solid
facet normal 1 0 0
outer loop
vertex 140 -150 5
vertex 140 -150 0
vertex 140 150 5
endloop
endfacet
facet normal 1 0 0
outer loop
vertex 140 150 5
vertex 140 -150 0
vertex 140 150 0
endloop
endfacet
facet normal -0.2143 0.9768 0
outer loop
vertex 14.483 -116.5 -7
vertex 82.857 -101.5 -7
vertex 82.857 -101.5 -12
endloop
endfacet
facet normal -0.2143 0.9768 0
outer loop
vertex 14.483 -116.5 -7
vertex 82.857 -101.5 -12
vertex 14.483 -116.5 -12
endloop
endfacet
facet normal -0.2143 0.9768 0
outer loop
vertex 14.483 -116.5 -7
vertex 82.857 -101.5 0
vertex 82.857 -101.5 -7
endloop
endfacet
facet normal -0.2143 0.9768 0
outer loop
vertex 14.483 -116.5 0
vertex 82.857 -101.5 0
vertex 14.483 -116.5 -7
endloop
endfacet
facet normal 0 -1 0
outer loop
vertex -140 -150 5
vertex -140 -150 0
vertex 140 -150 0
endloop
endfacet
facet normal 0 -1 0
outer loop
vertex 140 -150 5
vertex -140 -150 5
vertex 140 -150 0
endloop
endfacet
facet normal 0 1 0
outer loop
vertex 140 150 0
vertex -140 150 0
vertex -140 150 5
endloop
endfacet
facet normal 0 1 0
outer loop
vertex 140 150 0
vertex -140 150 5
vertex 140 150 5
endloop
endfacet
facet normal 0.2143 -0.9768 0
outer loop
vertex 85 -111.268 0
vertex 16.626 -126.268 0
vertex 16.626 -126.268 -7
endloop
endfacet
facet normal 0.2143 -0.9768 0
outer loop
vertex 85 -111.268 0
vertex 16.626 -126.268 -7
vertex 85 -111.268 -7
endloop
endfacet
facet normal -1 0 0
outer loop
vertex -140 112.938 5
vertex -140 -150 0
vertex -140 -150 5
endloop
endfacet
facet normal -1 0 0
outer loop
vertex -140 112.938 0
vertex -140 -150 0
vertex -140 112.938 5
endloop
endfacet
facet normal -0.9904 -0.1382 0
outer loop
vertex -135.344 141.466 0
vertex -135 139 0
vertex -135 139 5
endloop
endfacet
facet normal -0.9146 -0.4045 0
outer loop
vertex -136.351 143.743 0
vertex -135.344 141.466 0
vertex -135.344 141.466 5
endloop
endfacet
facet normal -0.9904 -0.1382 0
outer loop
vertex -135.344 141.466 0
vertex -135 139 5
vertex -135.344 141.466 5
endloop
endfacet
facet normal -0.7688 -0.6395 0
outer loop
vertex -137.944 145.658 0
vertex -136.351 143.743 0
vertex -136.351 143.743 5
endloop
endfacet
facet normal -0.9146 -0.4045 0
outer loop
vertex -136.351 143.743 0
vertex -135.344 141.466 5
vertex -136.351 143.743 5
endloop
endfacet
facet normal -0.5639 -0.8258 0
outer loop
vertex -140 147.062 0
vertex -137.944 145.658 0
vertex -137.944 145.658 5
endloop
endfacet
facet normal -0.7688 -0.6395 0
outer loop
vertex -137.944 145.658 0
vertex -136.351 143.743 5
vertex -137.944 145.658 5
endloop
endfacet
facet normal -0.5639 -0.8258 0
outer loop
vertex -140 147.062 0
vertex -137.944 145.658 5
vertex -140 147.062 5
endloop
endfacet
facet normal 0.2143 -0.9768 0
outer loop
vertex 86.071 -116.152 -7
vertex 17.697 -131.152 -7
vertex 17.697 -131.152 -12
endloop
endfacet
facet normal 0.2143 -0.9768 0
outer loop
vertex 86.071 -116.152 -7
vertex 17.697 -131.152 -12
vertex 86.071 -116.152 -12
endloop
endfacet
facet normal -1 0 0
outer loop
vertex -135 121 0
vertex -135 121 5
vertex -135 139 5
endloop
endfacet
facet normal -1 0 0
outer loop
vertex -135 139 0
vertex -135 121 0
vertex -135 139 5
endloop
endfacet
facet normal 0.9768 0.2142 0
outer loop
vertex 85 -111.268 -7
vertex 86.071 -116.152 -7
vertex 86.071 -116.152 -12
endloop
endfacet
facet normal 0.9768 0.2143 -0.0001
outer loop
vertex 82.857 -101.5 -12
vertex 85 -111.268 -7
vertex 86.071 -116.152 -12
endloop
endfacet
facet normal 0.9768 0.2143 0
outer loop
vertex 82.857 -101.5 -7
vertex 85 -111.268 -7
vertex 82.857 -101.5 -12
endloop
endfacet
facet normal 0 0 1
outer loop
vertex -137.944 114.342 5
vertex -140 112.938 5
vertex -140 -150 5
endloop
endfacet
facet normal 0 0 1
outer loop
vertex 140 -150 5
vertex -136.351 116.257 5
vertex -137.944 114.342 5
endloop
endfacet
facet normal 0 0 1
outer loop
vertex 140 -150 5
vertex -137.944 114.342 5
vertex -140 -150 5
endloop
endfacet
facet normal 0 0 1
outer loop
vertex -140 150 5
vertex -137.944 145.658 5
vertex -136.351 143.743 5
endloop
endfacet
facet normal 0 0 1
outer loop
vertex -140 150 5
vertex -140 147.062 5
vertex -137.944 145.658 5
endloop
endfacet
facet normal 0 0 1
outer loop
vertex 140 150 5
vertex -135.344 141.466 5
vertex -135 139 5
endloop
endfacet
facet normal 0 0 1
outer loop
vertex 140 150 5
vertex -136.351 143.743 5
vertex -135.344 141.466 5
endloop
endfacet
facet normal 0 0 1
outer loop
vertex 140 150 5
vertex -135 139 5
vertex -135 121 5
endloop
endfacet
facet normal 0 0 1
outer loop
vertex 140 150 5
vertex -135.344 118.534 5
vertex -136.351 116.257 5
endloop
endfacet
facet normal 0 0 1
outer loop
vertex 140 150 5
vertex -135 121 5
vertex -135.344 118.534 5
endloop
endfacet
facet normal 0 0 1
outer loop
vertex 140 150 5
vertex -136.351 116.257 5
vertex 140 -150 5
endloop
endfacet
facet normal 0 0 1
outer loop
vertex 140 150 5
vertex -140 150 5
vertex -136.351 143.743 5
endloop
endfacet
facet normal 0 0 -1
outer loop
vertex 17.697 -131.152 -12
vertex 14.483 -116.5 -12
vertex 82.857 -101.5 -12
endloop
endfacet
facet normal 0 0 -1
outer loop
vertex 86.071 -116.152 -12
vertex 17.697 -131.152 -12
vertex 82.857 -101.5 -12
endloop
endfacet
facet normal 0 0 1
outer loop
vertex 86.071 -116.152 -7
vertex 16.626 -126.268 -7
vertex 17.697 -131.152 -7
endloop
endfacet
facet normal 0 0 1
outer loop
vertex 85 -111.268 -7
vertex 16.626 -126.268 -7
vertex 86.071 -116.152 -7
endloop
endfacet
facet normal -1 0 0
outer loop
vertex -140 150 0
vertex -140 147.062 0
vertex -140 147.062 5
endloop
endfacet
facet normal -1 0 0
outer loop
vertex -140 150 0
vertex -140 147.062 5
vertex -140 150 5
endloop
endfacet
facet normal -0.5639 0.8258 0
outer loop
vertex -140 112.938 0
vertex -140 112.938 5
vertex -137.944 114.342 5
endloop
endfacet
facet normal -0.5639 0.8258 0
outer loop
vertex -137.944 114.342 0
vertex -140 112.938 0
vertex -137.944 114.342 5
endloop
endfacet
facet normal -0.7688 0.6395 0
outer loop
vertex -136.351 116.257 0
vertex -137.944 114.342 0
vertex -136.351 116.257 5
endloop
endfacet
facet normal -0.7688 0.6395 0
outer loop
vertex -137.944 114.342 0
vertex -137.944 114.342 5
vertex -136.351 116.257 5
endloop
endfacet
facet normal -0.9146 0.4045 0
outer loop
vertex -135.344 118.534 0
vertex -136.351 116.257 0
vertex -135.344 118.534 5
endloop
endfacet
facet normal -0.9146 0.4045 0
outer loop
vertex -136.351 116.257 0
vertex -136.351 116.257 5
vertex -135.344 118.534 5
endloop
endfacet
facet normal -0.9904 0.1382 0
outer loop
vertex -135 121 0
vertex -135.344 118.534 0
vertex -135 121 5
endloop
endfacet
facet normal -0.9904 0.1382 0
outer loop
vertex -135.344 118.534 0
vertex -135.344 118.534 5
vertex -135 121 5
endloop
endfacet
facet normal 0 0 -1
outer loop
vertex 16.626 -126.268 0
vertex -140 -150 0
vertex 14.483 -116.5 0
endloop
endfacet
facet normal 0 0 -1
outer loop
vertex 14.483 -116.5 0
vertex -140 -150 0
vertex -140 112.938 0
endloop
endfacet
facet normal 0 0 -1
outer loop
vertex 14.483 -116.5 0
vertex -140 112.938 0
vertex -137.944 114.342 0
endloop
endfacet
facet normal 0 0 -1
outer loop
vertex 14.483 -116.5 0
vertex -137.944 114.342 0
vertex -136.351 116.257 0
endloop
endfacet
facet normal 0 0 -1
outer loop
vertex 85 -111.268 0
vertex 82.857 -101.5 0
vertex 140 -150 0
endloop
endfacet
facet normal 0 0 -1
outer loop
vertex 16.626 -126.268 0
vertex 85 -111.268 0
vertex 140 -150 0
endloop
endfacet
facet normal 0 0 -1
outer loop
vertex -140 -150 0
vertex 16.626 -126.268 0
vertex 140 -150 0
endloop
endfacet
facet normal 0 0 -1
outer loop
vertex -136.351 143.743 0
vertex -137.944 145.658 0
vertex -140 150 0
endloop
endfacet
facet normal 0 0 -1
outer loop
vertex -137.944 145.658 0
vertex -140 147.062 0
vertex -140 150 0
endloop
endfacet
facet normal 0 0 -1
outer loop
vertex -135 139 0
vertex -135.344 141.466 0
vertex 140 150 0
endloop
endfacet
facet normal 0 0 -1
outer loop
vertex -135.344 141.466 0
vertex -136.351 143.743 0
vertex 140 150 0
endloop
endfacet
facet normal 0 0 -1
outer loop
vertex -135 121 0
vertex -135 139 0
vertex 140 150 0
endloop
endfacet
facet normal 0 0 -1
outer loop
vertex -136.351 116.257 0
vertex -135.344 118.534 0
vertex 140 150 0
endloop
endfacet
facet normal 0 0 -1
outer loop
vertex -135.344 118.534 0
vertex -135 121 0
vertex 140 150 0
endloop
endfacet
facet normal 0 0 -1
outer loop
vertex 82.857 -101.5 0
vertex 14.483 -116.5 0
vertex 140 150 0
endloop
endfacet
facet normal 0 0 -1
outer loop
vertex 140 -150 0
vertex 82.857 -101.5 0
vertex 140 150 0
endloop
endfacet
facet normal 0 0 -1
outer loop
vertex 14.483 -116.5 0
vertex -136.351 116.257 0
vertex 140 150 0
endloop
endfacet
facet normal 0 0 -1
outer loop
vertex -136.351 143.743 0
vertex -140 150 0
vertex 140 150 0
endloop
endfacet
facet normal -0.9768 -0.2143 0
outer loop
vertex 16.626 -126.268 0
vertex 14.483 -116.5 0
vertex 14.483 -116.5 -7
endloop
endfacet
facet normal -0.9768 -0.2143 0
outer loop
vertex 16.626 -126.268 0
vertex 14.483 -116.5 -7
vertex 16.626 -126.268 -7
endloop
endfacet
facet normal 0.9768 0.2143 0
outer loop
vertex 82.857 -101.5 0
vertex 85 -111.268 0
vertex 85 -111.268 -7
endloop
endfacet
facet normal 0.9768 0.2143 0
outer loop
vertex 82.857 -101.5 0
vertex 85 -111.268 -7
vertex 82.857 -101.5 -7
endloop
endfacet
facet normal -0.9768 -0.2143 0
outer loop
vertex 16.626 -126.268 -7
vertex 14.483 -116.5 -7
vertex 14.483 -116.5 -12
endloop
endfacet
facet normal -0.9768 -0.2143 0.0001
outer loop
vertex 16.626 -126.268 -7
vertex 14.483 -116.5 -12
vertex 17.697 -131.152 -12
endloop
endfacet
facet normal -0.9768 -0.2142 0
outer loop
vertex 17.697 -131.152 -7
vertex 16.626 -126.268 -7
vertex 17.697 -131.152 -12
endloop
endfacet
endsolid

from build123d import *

# Parameters (mm, degrees)
SKETCH1_W           = 280
SKETCH1_H           = 300
BOSS_EXTRUDE1_DEPTH = 5
CUT_EXTRUDE1_DEPTH  = 6
BOSS_EXTRUDE2_DEPTH = 7
BOSS_EXTRUDE3_DEPTH = 5


with BuildPart() as part:
    # Sketch1 → Boss-Extrude1 (new body)
    with BuildSketch(Plane.XY):
        Rectangle(SKETCH1_W, SKETCH1_H)
    extrude(amount=BOSS_EXTRUDE1_DEPTH)

    # Sketch2 → Cut-Extrude1 (cut, through all)
    with BuildSketch(Plane.XY.offset(5)):
        with BuildLine():
            Line((-153, 139), (-153, 121))
            ThreePointArc((-153, 121), (-144, 112), (-135, 121))
            Line((-135, 121), (-135, 139))
            ThreePointArc((-135, 139), (-144, 148), (-153, 139))
        make_face()
    extrude(amount=-CUT_EXTRUDE1_DEPTH, mode=Mode.SUBTRACT)

    # Sketch3 → Boss-Extrude2 (add)
    with BuildSketch(Plane(origin=(0, 0, 0), x_dir=(-1, 0, 0), z_dir=(0, 0, -1))):
        Polygon((-82.857142857, -101.5), (-14.483171201, -116.5), (-16.626028344, -126.267710237), (-85, -111.267710237), align=None)
    extrude(amount=BOSS_EXTRUDE2_DEPTH)

    # Sketch4 → Boss-Extrude3 (add)
    with BuildSketch(Plane(origin=(0, 0, -7), x_dir=(-1, 0, 0), z_dir=(0, 0, -1))):
        Polygon((-82.857142857, -101.5), (-14.483171201, -116.5), (-17.697456916, -131.151565355), (-86.071428571, -116.151565355), align=None)
    extrude(amount=BOSS_EXTRUDE3_DEPTH)


solid = part.part
